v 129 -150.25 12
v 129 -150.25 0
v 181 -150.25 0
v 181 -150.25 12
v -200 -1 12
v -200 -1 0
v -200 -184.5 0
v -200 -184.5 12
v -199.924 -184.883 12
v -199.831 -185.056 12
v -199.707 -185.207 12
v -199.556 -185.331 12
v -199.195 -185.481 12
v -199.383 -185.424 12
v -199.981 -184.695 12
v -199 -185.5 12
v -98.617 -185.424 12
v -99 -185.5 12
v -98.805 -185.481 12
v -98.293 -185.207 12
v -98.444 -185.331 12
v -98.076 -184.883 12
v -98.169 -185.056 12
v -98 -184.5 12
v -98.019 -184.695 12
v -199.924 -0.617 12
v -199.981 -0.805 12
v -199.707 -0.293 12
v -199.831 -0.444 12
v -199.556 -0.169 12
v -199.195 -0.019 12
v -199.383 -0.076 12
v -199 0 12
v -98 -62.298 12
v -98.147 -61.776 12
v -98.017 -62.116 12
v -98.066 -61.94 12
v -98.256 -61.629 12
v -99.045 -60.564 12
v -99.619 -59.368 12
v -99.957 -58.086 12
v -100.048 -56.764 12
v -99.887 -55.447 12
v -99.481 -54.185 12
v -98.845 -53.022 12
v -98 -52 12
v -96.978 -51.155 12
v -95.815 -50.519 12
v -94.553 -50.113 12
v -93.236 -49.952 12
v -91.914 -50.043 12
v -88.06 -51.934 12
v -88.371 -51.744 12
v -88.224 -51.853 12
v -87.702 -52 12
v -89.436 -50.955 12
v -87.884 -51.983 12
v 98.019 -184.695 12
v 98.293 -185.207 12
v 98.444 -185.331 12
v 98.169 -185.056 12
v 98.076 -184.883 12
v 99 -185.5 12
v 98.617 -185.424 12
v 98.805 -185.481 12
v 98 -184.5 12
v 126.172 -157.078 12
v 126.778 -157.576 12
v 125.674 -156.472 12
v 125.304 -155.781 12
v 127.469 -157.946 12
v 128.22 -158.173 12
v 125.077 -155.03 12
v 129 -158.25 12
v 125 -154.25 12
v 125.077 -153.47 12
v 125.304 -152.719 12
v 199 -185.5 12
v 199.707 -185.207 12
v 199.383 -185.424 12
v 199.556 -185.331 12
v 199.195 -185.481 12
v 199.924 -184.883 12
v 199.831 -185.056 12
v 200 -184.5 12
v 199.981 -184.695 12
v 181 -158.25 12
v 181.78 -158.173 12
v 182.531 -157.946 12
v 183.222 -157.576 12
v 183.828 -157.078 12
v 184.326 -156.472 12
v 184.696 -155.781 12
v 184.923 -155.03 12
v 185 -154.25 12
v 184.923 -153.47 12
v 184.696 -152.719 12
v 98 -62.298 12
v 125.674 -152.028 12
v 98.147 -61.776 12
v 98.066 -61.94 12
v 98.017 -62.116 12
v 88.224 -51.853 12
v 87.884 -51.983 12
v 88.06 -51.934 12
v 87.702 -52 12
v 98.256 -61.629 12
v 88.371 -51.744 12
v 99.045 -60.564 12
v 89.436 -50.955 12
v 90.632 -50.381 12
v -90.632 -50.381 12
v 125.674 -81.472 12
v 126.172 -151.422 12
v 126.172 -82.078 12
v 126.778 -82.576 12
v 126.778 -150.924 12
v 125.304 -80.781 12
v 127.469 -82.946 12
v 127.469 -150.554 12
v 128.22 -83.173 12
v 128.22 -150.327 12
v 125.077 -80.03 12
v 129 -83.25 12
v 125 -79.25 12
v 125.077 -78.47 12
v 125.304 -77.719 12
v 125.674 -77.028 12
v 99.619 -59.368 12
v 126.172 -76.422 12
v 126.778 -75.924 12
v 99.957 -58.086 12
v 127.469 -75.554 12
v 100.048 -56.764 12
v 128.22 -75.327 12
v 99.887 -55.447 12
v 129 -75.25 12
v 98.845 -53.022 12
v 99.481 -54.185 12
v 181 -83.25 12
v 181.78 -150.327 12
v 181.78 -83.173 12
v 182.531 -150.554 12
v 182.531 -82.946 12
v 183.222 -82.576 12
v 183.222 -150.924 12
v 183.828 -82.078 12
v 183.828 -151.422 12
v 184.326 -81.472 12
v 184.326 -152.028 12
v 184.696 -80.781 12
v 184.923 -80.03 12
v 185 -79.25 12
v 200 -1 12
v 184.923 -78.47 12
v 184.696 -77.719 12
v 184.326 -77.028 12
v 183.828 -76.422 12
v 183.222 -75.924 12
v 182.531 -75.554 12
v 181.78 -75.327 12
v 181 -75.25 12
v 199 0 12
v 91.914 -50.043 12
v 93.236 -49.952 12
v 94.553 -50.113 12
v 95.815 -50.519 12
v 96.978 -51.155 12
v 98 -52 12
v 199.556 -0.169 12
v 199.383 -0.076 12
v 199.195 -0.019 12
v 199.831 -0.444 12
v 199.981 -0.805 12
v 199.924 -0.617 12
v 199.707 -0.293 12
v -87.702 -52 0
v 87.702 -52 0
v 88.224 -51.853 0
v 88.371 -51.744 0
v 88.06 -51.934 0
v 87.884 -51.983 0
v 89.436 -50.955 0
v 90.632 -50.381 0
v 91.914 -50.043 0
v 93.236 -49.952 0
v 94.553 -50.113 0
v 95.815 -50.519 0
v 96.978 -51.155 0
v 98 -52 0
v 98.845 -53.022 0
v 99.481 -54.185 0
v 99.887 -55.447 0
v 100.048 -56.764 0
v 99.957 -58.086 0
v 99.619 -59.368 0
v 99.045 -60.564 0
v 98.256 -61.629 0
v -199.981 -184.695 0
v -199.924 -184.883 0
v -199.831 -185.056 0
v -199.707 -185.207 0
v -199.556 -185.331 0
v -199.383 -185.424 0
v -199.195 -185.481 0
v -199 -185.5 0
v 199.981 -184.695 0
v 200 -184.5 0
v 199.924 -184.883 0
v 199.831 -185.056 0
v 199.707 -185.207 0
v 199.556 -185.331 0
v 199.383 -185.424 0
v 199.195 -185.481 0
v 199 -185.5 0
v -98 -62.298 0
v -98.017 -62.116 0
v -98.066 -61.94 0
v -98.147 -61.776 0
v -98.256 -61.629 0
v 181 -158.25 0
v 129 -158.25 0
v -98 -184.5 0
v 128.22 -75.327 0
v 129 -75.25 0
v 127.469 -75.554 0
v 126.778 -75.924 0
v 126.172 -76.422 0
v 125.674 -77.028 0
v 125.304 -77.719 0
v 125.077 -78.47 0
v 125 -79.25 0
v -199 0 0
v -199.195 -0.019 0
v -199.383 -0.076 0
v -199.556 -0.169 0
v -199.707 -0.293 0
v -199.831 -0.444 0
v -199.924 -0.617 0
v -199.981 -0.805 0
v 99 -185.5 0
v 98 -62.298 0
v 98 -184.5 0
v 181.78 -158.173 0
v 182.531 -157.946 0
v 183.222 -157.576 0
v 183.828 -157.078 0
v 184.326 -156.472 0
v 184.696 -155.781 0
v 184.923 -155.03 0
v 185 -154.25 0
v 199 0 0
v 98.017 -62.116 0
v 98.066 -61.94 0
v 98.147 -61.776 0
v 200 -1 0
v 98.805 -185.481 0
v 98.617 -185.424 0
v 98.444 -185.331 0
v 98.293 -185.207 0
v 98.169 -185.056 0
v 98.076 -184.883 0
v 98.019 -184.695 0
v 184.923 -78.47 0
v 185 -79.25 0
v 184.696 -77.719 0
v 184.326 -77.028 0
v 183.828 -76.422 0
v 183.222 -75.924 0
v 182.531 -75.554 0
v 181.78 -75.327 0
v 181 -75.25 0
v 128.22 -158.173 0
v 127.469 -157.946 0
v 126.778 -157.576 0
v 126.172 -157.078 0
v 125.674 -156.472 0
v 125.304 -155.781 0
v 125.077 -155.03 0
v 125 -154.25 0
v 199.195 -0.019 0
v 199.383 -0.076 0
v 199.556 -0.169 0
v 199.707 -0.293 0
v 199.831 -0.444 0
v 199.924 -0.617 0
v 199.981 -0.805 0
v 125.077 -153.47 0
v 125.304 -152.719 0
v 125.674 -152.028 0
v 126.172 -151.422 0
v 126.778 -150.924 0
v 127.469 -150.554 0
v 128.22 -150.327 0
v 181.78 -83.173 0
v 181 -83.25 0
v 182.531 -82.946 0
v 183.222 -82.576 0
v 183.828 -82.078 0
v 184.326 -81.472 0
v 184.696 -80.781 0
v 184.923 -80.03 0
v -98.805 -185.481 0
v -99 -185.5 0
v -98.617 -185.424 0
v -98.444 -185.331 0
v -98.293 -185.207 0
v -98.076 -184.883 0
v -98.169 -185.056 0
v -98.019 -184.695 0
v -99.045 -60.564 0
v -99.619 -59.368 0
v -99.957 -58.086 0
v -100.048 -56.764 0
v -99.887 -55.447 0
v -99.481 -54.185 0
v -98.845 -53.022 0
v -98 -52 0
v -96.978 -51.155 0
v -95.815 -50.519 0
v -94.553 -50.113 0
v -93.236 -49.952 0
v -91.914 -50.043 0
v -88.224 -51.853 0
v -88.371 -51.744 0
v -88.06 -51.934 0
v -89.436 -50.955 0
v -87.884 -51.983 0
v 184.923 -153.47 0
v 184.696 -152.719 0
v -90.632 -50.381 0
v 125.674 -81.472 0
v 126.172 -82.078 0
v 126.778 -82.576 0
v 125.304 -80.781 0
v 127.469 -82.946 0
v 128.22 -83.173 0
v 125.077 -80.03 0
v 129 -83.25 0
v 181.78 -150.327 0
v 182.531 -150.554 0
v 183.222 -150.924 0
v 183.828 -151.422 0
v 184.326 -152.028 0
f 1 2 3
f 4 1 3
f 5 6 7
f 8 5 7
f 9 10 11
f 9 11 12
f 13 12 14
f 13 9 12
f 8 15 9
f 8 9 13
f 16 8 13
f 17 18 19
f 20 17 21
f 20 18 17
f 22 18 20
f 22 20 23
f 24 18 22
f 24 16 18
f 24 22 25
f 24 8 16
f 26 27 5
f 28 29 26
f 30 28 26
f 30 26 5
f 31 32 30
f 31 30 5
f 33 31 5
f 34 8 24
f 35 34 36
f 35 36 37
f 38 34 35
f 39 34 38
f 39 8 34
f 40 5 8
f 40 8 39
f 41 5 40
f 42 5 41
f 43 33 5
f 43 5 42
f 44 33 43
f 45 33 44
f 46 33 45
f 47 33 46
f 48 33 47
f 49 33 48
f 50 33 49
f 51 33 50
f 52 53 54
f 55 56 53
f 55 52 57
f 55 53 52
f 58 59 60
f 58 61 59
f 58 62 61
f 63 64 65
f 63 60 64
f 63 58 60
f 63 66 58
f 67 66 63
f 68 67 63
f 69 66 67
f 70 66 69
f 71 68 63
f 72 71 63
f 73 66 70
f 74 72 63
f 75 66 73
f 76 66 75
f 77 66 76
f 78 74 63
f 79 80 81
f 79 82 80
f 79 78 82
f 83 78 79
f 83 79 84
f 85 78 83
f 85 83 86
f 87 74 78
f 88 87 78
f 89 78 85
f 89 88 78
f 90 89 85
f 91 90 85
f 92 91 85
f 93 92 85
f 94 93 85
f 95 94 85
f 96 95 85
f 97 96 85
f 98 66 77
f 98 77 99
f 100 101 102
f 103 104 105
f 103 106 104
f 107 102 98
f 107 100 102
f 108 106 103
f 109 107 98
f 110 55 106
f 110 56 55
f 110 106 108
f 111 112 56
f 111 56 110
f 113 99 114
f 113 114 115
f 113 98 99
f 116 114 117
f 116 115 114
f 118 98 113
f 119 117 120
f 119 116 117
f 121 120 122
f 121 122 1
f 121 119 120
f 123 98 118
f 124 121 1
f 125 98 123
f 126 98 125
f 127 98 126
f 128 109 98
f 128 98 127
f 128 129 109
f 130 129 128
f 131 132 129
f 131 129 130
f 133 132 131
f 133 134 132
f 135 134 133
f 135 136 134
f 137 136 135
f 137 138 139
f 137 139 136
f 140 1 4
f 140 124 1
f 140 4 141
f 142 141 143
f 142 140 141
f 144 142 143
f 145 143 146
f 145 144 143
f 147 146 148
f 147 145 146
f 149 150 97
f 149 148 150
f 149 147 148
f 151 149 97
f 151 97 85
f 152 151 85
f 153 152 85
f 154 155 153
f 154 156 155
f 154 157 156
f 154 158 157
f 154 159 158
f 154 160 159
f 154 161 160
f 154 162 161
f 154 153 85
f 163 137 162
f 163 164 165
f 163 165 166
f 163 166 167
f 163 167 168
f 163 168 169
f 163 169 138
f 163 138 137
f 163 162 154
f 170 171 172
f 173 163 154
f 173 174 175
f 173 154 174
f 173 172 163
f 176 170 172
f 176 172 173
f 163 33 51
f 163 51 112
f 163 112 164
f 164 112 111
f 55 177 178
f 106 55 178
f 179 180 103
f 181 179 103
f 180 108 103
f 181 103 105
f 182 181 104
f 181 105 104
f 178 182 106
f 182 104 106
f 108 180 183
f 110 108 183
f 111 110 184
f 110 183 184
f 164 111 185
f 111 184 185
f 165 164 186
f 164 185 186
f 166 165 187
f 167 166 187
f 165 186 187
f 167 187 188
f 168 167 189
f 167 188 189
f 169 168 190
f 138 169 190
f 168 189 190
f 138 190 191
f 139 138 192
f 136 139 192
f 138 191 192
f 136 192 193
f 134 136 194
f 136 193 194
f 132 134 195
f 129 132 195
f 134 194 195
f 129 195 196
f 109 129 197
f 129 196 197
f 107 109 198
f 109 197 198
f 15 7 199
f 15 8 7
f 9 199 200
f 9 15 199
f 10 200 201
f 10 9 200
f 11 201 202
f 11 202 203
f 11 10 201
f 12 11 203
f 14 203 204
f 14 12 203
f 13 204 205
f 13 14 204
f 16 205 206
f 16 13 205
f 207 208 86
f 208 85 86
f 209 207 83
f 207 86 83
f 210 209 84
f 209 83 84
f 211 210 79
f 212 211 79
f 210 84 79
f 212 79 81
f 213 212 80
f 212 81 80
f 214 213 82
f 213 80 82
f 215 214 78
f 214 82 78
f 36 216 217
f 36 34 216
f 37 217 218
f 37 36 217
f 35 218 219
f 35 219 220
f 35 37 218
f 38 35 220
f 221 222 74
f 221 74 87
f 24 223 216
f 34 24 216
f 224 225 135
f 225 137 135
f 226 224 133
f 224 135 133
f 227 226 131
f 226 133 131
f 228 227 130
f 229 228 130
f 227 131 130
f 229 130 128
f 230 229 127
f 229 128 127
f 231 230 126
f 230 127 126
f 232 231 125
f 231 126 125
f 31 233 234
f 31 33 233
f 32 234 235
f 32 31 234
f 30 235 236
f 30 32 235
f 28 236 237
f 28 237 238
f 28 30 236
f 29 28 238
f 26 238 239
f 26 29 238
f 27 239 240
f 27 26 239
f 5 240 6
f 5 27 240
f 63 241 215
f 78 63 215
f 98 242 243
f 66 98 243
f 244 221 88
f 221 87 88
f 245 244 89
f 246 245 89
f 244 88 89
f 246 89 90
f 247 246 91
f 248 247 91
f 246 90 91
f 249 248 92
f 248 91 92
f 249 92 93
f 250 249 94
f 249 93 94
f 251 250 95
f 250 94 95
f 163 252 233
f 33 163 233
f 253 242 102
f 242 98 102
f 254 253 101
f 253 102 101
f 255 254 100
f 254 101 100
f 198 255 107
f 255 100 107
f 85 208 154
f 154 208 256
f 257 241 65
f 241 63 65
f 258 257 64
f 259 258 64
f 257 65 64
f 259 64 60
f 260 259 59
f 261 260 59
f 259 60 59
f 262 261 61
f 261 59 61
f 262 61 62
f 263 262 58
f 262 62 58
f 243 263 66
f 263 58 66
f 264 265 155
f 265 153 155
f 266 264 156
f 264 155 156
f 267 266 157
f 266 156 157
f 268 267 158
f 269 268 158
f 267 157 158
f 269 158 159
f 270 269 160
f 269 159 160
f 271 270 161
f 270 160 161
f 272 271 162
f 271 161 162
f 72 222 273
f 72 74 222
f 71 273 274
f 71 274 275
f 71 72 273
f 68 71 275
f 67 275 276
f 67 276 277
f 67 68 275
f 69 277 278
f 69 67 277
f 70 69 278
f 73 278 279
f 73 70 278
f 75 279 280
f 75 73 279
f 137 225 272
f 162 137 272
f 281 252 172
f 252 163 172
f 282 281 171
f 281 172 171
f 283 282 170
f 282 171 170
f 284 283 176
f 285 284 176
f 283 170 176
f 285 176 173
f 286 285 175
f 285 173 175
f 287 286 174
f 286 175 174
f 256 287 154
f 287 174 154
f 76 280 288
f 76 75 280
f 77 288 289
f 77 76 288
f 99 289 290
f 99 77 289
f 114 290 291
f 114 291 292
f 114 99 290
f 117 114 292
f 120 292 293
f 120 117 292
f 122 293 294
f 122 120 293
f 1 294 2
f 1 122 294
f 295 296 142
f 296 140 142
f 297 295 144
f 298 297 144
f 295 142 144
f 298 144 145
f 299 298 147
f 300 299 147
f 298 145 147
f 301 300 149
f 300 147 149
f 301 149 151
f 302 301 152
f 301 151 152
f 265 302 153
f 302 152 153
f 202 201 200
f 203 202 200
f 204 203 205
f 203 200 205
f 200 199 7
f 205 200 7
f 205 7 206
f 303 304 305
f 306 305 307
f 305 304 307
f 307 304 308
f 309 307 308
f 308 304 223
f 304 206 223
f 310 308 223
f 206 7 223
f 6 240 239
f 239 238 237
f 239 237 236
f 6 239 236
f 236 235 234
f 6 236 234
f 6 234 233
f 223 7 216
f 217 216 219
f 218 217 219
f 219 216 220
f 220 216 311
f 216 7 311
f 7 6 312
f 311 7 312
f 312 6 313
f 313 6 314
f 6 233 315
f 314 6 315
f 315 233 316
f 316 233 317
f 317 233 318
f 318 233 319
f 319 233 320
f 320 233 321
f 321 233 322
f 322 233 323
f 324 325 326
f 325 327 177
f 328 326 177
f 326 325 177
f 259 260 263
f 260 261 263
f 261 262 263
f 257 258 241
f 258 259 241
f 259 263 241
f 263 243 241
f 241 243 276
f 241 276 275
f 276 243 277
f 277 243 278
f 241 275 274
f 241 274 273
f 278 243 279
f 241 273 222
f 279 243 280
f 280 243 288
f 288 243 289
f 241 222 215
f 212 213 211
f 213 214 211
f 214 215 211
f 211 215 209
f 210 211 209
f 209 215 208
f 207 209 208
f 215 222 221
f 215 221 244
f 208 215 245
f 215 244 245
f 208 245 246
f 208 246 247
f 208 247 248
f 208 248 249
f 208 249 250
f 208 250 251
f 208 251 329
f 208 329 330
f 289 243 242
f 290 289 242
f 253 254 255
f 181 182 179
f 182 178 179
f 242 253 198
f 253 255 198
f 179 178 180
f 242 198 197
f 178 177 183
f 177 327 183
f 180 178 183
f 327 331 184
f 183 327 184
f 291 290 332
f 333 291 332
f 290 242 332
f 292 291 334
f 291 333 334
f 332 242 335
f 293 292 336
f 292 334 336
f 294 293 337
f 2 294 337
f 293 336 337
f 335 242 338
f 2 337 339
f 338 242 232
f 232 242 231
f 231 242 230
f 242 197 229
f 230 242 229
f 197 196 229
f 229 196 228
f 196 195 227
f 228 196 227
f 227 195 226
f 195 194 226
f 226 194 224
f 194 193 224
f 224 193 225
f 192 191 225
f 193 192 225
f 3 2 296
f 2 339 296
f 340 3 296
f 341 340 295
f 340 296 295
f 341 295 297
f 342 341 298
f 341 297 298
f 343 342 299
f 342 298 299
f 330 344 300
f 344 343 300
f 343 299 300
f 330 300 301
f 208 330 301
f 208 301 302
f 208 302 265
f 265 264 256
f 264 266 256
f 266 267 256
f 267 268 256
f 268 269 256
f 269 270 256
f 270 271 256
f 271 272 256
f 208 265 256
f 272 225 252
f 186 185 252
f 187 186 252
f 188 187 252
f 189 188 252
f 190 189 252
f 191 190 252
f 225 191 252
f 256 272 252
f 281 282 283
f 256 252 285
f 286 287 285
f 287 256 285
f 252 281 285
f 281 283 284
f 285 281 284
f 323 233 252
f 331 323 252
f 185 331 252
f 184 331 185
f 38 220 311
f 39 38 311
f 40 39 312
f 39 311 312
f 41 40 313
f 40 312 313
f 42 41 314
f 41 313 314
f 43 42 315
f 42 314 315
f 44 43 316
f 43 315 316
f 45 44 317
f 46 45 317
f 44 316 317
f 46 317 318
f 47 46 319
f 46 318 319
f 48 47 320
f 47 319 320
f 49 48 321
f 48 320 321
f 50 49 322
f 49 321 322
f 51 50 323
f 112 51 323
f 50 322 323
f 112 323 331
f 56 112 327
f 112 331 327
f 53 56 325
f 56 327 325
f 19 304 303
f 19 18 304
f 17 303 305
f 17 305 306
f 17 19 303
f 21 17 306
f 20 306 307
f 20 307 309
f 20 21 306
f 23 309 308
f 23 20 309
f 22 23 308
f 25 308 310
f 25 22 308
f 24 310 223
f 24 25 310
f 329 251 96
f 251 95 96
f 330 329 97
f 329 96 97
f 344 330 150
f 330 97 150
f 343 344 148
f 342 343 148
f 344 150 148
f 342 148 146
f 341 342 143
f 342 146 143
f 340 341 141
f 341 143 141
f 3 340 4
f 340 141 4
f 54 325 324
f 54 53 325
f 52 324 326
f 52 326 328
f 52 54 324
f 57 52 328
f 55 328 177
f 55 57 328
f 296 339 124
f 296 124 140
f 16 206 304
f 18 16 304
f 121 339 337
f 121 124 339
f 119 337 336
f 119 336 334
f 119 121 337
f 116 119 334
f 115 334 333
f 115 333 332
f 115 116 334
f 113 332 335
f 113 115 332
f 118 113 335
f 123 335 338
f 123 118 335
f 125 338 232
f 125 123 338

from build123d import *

# Parameters (mm, degrees)
F0_W     = 60
F0_H     = 8
F1_DEPTH = 12
F2_R     = 1
F3_R     = 3.99999


# Not quite as in the source:
# - a fillet or chamfer is up to 0.001 mm smaller than in the source, because OpenCascade refuses the exact size


with BuildPart() as f1:
    # F0 (on Top) → F1 (new body)
    with BuildSketch(Plane.XY):
        with BuildLine():
            Line((200, 0), (-200, 0))
            Line((-200, 0), (-200, -185.5))
            Line((-200, -185.5), (-98, -185.5))
            Line((-98, -185.5), (-98, -61.8994949366))
            ThreePointArc((-98, -61.8994949366), (-98, -52), (-88.1005050634, -52))
            Line((-88.1005050634, -52), (88.1005050634, -52))
            ThreePointArc((88.1005050634, -52), (98, -52), (98, -61.8994949366))
            Line((98, -61.8994949366), (98, -185.5))
            Line((98, -185.5), (200, -185.5))
            Line((200, -185.5), (200, 0))
        make_face()
        with Locations((155, -154.25)):
            Rectangle(F0_W, F0_H, mode=Mode.SUBTRACT)
        with Locations((155, -79.25)):
            Rectangle(F0_W, F0_H, mode=Mode.SUBTRACT)
    extrude(amount=F1_DEPTH)

    # F2
    f2_edges = [f1.edges().sort_by_distance(p)[0] for p in [
        (-98, -185.5, 6),
        (-98, -61.899495, 6),
        (-88.100505, -52, 6),
        (88.100505, -52, 6),
        (98, -61.899495, 6),
        (98, -185.5, 6),
        (200, -185.5, 6),
        (200, 0, 6),
        (-200, 0, 6),
        (-200, -185.5, 6),
    ]]
    fillet(f2_edges, radius=F2_R)

    # F3 (radius 4 in the source; OpenCascade refuses exactly that, so slightly less here)
    f3_edges = [f1.edges().sort_by_distance(p)[0] for p in [
        (125, -158.25, 6),
        (125, -150.25, 6),
        (185, -158.25, 6),
        (185, -150.25, 6),
        (125, -83.25, 6),
        (125, -75.25, 6),
        (185, -83.25, 6),
        (185, -75.25, 6),
    ]]
    fillet(f3_edges, radius=F3_R)


solid = f1.part
